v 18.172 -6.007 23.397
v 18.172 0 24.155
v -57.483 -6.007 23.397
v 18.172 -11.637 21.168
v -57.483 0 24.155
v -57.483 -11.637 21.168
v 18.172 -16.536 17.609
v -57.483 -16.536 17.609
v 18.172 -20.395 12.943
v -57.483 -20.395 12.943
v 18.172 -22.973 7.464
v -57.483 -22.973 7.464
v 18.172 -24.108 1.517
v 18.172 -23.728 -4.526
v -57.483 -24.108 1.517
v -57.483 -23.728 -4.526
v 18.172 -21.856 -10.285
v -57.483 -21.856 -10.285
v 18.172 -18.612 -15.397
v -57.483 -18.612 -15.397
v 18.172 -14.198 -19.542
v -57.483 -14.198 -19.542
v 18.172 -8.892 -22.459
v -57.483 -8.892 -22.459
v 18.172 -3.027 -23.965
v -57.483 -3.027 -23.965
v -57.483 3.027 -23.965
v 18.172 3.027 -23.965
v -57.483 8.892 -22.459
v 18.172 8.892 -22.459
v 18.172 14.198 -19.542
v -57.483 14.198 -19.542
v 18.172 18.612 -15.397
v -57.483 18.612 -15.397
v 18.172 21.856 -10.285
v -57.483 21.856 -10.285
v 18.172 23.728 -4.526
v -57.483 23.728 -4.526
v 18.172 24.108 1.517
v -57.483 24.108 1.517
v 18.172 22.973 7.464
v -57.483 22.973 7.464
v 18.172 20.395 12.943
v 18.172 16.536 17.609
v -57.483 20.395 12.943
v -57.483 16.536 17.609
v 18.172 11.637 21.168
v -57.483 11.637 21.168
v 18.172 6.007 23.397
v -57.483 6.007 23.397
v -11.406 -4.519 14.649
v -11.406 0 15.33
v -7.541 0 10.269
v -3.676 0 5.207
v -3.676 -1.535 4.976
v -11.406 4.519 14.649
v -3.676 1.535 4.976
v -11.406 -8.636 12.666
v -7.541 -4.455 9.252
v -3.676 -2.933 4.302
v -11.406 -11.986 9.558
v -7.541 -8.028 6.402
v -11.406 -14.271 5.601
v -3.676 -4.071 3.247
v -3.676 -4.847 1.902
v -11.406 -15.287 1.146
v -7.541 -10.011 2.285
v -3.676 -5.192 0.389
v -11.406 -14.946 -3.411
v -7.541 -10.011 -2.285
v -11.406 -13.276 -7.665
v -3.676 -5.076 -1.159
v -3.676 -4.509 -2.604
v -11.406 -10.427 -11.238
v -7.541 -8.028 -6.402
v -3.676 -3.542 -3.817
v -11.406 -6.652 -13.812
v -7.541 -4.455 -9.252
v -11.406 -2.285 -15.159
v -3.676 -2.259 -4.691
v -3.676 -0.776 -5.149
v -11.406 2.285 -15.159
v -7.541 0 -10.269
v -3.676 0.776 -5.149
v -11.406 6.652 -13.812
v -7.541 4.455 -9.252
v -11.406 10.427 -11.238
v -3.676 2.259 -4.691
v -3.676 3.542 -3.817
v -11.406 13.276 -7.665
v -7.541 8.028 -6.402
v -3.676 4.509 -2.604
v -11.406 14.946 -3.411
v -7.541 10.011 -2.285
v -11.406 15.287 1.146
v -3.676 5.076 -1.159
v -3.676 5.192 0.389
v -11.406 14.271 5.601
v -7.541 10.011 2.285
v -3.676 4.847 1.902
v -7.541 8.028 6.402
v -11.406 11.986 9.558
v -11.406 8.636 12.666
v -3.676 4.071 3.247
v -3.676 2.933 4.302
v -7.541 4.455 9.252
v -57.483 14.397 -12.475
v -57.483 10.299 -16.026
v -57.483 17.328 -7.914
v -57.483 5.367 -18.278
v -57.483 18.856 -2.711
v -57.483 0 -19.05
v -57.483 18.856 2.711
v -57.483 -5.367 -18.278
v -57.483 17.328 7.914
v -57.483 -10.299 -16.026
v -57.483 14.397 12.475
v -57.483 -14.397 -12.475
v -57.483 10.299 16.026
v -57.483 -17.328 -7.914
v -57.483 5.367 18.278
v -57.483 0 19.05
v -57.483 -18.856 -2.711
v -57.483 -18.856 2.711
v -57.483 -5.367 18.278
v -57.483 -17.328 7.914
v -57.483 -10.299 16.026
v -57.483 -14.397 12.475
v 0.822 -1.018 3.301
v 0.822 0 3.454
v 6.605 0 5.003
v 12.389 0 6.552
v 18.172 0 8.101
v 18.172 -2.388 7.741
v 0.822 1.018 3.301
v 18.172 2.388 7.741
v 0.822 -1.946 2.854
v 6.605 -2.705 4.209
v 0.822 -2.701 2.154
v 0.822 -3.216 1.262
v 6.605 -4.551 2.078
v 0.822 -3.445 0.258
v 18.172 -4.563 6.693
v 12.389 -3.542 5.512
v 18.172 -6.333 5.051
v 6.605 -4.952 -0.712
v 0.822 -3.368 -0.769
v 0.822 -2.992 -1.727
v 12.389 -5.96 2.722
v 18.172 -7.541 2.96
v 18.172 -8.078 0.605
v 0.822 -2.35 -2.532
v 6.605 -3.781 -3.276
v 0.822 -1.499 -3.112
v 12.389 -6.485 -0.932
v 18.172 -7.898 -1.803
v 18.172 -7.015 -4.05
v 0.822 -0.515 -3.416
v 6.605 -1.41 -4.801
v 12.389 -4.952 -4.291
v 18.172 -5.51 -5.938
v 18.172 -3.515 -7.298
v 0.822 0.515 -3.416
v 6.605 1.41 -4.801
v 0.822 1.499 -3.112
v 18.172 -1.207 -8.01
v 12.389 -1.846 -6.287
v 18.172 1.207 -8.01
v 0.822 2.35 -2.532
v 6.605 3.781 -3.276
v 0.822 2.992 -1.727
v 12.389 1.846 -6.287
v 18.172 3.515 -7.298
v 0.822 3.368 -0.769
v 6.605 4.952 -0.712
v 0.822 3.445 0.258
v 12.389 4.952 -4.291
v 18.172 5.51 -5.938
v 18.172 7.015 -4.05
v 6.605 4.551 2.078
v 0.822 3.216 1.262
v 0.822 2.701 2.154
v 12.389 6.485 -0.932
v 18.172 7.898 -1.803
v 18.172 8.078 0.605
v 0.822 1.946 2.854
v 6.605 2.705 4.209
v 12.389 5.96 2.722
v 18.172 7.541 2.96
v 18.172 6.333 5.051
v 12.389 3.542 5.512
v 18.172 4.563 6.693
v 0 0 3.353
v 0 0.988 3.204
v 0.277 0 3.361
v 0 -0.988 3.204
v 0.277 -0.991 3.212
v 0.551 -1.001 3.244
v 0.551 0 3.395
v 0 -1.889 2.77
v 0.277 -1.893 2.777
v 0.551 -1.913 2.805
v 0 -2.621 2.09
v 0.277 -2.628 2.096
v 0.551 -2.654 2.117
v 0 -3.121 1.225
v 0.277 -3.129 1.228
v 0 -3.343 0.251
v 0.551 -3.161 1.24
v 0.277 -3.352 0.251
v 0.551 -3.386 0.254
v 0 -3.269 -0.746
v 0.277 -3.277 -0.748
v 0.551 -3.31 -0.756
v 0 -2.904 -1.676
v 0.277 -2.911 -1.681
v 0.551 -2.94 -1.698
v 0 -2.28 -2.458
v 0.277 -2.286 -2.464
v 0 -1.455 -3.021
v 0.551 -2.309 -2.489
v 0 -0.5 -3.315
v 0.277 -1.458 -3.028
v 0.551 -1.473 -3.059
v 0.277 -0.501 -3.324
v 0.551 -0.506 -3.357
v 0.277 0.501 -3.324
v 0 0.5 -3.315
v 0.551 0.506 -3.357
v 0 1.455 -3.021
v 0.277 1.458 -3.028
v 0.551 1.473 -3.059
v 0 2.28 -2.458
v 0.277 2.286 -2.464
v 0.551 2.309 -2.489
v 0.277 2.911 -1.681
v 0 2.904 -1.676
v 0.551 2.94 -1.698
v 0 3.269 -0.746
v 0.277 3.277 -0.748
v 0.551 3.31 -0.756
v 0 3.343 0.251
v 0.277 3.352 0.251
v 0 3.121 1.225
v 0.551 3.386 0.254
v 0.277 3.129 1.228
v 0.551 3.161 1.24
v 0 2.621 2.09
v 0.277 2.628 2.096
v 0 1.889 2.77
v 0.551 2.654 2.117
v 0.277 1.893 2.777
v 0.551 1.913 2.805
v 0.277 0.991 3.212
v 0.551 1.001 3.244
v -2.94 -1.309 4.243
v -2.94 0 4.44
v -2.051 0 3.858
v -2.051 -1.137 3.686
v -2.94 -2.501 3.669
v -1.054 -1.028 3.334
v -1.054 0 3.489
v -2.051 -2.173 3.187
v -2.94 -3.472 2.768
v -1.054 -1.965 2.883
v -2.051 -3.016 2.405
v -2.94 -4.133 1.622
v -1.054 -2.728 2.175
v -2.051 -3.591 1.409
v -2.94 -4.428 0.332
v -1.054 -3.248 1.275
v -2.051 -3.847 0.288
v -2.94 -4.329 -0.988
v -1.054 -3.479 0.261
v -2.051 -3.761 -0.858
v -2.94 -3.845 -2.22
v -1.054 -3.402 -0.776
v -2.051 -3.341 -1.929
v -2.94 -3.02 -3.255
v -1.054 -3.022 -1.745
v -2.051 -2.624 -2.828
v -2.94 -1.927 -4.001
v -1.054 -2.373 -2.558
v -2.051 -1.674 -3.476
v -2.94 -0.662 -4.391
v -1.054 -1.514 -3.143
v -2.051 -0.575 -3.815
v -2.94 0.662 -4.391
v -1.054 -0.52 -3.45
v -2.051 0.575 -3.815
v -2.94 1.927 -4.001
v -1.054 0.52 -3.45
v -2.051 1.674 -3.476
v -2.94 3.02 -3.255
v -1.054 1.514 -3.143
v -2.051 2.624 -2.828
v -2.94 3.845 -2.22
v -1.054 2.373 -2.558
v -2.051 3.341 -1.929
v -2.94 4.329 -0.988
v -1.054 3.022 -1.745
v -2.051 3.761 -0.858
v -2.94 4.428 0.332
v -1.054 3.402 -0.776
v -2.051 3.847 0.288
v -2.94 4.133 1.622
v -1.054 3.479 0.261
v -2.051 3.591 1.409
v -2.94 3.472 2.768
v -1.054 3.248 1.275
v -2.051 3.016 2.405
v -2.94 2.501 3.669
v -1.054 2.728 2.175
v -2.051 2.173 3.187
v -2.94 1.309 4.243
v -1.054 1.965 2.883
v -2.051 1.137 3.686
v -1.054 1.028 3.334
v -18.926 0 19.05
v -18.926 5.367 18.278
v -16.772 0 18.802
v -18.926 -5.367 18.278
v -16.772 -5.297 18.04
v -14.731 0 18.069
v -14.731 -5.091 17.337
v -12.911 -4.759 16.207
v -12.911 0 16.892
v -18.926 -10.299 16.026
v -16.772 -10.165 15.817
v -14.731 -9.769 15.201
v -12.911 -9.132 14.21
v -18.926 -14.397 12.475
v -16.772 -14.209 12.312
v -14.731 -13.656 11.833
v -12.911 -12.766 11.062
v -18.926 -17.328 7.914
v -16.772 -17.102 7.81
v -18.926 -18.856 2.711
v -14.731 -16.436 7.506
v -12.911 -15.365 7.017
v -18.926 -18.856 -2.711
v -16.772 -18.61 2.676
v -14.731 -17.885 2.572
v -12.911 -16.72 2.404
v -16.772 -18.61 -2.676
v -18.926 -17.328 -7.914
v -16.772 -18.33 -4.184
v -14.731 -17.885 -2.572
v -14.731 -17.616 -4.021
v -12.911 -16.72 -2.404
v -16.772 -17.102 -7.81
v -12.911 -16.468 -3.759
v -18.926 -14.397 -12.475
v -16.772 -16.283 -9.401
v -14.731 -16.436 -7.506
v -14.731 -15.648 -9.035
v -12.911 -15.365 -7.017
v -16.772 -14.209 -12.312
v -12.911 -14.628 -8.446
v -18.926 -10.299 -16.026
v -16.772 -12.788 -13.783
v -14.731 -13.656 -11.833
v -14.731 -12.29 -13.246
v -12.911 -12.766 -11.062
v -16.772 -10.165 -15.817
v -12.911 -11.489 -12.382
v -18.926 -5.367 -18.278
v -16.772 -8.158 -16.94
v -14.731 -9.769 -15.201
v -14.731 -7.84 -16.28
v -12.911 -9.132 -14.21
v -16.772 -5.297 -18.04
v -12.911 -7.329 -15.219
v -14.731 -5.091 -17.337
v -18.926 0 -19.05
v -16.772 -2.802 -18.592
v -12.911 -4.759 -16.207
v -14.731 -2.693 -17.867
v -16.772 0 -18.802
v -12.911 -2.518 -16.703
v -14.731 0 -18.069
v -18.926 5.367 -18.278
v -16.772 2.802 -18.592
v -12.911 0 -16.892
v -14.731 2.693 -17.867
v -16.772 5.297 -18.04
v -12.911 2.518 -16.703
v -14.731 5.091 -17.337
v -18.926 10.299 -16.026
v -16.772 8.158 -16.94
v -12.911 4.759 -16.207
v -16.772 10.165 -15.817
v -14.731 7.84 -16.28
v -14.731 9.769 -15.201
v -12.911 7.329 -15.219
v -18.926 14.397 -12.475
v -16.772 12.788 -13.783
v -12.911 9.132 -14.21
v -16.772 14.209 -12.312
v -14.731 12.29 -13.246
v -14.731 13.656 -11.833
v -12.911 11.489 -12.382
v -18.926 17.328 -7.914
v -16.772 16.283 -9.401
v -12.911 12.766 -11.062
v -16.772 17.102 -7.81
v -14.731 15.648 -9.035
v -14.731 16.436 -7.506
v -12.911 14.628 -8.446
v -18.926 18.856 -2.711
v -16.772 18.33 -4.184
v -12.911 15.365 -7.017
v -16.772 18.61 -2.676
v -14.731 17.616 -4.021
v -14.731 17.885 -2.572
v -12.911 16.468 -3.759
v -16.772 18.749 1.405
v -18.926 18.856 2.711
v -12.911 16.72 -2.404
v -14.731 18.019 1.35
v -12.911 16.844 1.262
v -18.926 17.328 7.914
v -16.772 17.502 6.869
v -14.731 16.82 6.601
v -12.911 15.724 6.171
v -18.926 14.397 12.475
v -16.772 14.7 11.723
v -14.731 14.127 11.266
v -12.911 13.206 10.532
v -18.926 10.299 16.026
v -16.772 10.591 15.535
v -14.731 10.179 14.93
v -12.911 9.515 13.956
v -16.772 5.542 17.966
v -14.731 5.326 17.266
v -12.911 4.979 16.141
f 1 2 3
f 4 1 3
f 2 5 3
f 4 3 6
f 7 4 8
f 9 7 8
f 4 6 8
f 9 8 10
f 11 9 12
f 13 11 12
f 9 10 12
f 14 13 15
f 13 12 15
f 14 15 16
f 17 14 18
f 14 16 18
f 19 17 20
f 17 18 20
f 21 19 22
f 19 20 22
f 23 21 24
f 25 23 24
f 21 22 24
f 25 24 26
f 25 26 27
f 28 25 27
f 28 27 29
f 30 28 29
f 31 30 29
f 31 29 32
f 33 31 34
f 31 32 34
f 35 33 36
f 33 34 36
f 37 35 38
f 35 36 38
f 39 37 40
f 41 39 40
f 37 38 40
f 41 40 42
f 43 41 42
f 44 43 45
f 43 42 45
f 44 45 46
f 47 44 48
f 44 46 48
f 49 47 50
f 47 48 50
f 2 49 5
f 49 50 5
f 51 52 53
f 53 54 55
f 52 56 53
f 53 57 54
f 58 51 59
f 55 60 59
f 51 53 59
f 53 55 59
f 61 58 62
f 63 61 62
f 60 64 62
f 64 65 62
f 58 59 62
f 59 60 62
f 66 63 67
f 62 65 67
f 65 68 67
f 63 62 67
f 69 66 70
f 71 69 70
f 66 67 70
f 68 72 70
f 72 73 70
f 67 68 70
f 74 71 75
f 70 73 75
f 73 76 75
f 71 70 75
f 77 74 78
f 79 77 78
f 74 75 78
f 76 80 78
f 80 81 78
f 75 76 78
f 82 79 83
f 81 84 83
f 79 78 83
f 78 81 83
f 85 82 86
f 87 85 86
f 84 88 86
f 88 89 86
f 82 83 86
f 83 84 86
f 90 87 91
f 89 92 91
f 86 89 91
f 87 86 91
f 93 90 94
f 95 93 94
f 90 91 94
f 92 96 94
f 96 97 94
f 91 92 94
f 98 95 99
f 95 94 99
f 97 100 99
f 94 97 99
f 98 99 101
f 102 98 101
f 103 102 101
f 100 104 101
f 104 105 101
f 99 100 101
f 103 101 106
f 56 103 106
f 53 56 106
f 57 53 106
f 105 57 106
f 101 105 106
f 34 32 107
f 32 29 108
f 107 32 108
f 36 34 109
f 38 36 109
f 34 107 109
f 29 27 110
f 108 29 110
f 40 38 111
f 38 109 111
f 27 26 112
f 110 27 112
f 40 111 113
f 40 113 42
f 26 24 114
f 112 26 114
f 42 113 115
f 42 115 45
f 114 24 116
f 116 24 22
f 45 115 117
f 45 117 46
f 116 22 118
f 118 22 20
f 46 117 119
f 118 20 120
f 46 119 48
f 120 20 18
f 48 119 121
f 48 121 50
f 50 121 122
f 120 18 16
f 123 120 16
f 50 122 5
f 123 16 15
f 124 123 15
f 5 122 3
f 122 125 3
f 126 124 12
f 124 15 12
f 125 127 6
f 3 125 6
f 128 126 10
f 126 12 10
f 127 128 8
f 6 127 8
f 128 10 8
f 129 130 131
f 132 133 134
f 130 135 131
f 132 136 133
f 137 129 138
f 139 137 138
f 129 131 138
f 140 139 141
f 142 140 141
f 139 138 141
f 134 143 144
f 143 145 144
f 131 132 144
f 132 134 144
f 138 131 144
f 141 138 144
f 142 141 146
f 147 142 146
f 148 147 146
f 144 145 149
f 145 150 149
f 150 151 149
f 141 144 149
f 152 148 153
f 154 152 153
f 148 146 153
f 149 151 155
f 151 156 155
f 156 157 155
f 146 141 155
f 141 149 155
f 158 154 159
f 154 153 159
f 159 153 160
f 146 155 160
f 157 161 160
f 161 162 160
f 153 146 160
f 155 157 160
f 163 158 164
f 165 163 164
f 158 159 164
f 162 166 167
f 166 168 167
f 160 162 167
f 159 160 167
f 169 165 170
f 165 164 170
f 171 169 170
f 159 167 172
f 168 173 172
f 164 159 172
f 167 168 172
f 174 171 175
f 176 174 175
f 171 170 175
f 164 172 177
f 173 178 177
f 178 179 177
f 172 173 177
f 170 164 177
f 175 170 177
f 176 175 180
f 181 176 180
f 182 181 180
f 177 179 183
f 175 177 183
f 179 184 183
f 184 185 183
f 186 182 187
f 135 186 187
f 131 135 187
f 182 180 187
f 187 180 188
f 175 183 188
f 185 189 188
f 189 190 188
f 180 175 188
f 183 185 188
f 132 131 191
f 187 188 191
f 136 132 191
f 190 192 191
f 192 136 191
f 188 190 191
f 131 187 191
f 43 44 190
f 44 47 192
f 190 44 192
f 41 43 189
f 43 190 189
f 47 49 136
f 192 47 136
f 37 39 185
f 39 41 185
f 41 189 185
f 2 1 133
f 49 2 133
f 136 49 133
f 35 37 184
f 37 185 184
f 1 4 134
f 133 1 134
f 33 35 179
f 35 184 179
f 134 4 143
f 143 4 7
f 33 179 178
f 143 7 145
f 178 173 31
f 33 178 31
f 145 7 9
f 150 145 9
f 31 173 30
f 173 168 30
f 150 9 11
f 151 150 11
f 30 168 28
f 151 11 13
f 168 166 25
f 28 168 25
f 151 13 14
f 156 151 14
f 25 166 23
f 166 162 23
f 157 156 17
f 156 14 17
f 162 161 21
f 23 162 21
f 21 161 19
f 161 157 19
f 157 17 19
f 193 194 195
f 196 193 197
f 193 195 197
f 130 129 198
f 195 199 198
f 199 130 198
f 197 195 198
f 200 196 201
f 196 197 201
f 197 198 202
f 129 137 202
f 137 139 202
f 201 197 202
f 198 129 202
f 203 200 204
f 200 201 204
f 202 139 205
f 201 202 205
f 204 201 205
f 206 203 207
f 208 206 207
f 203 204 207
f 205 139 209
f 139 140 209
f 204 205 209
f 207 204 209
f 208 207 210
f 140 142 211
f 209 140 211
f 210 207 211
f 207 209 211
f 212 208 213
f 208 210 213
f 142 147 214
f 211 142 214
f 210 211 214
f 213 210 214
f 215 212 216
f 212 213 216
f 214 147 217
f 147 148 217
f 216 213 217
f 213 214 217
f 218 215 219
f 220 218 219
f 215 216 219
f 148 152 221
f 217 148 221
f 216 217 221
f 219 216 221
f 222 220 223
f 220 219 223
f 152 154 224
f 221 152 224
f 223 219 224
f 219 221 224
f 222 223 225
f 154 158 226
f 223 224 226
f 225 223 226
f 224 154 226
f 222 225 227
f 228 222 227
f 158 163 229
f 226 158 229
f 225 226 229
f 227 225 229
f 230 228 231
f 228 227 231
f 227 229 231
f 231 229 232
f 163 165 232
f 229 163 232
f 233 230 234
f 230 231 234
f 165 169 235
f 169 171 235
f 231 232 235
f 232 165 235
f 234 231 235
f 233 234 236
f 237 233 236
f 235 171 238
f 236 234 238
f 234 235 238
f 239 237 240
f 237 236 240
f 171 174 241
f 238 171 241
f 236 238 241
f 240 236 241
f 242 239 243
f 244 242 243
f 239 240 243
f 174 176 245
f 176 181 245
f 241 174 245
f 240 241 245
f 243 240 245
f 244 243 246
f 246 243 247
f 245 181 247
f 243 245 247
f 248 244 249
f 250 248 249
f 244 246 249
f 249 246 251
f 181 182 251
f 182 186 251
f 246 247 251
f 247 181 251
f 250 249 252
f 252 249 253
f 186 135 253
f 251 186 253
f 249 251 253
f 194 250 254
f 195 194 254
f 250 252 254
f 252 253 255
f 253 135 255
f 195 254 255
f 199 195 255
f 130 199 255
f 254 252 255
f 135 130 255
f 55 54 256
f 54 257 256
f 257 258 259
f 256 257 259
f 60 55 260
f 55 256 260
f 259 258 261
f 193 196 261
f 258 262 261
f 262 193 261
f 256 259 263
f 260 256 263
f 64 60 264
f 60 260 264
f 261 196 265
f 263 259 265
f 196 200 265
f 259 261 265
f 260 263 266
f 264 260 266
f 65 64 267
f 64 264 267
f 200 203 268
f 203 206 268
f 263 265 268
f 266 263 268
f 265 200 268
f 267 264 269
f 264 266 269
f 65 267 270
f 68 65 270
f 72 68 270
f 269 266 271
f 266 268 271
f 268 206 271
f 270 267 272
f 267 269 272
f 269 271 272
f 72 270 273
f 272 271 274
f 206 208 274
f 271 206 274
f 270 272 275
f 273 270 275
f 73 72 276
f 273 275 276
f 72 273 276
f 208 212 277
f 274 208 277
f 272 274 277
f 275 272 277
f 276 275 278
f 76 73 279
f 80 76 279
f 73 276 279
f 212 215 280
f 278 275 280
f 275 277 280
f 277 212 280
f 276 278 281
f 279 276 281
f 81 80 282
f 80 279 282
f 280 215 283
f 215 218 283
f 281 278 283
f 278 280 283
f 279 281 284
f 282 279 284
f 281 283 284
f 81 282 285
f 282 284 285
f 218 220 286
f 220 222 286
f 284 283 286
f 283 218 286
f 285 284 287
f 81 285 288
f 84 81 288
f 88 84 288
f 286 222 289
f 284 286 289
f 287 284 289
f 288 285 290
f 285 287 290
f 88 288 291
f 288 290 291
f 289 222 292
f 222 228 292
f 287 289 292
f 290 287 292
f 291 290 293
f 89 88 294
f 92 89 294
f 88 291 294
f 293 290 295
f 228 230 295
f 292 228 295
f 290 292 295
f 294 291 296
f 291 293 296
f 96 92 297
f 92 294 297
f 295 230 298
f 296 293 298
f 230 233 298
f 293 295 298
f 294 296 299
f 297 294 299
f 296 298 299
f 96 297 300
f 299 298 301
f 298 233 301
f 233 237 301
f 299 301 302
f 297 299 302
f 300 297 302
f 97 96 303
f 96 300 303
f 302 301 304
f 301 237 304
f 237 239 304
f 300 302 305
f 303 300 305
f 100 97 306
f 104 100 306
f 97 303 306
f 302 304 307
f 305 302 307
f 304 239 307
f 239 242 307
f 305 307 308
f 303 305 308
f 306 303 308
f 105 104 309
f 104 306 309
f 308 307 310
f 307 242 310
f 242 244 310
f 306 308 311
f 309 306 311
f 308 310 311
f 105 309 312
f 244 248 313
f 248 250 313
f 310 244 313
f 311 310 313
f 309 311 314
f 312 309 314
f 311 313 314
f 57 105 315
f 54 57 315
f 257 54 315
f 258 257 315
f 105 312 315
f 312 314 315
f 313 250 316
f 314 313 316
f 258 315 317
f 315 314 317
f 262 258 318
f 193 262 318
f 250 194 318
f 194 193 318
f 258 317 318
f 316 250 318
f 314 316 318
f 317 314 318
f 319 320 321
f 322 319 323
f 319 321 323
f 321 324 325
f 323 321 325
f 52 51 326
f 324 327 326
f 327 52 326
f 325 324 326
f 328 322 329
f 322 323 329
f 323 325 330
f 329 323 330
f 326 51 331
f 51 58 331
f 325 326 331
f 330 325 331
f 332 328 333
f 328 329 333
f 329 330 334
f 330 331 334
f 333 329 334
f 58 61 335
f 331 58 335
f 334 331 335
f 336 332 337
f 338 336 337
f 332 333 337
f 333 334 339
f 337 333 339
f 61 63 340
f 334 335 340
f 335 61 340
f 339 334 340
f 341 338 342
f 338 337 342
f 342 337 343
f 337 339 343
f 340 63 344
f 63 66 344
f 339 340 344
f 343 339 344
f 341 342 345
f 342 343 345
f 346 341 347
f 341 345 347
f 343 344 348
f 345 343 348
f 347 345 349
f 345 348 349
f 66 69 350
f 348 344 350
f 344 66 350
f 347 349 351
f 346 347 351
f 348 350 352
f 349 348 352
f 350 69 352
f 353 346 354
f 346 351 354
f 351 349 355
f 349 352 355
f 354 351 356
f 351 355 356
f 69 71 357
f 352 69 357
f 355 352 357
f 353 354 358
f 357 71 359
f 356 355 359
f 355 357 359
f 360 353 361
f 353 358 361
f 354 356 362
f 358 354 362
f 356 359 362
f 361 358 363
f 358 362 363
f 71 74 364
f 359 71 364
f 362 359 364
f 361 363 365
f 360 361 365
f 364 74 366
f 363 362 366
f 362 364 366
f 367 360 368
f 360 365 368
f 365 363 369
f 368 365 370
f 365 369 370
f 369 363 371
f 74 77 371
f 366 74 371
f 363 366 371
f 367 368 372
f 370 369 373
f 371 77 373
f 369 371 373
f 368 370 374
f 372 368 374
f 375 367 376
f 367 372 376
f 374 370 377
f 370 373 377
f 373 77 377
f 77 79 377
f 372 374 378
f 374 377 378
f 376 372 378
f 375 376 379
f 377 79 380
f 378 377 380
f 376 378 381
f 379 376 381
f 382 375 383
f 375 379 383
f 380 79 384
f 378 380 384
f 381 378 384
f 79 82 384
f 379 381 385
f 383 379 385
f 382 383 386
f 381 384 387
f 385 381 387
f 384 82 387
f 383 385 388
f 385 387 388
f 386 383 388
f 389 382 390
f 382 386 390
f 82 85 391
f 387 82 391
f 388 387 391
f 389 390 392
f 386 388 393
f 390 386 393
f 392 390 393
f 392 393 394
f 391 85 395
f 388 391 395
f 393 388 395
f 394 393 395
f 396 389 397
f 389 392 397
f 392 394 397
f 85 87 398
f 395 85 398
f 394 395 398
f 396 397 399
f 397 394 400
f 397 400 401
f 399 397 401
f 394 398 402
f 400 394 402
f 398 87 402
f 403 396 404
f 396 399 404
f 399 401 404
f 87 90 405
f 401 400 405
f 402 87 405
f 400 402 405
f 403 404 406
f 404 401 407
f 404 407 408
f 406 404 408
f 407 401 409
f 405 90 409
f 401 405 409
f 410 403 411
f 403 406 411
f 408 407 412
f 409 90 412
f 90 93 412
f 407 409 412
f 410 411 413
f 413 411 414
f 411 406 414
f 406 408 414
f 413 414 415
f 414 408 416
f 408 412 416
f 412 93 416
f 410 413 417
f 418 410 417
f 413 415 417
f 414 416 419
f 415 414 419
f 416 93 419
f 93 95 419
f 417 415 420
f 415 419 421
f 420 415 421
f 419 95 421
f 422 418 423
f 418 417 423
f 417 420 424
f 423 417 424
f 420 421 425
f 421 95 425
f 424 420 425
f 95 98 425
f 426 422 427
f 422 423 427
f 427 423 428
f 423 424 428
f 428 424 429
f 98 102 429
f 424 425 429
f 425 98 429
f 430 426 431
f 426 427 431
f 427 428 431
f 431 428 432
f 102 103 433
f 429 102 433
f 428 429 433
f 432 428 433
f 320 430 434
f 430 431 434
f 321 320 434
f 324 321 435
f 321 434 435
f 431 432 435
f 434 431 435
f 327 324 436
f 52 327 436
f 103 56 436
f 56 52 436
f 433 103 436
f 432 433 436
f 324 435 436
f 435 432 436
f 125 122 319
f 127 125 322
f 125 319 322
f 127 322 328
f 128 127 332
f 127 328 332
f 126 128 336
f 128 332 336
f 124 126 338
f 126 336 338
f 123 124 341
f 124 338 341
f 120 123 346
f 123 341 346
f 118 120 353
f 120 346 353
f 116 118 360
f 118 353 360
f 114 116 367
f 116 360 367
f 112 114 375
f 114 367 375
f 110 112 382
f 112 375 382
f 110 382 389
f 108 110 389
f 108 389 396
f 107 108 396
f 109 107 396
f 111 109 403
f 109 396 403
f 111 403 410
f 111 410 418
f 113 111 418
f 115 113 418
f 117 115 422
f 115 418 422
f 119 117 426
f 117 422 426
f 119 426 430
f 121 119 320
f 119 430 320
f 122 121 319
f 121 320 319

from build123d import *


with BuildPart() as part:
    # Sketch1 → Revolve1 (revolve)
    with BuildSketch(Plane.XY, mode=Mode.PRIVATE) as revolve1_sk:
        with BuildLine():
            Line((-57.482999588, 19.05), (-18.926427283, 19.05))
            ThreePointArc((-18.926427283, 19.05), (-14.731391707, 18.069235016), (-11.406001811, 15.330256106))
            Line((-11.406001811, 15.330256106), (-3.676186486, 5.207))
            ThreePointArc((-3.676186486, 5.207), (-2.051025346, 3.857735121), (0, 3.3528))
            ThreePointArc((0, 3.3528), (0.414402348, 3.375072305), (0.821750452, 3.4544))
            Line((0.821750452, 3.4544), (18.172025124, 8.100703128))
            Line((18.172025124, 8.100703128), (18.172025124, 24.1554))
            Line((18.172025124, 24.1554), (-57.482999588, 24.1554))
            Line((-57.482999588, 24.1554), (-57.482999588, 19.05))
        make_face()
    revolve(revolve1_sk.sketch.rotate(Axis((-50.899256216, 0, 0), (1, 0, 0)), 90), axis=Axis((-50.899256216, 0, 0), (1, 0, 0)))


solid = part.part
